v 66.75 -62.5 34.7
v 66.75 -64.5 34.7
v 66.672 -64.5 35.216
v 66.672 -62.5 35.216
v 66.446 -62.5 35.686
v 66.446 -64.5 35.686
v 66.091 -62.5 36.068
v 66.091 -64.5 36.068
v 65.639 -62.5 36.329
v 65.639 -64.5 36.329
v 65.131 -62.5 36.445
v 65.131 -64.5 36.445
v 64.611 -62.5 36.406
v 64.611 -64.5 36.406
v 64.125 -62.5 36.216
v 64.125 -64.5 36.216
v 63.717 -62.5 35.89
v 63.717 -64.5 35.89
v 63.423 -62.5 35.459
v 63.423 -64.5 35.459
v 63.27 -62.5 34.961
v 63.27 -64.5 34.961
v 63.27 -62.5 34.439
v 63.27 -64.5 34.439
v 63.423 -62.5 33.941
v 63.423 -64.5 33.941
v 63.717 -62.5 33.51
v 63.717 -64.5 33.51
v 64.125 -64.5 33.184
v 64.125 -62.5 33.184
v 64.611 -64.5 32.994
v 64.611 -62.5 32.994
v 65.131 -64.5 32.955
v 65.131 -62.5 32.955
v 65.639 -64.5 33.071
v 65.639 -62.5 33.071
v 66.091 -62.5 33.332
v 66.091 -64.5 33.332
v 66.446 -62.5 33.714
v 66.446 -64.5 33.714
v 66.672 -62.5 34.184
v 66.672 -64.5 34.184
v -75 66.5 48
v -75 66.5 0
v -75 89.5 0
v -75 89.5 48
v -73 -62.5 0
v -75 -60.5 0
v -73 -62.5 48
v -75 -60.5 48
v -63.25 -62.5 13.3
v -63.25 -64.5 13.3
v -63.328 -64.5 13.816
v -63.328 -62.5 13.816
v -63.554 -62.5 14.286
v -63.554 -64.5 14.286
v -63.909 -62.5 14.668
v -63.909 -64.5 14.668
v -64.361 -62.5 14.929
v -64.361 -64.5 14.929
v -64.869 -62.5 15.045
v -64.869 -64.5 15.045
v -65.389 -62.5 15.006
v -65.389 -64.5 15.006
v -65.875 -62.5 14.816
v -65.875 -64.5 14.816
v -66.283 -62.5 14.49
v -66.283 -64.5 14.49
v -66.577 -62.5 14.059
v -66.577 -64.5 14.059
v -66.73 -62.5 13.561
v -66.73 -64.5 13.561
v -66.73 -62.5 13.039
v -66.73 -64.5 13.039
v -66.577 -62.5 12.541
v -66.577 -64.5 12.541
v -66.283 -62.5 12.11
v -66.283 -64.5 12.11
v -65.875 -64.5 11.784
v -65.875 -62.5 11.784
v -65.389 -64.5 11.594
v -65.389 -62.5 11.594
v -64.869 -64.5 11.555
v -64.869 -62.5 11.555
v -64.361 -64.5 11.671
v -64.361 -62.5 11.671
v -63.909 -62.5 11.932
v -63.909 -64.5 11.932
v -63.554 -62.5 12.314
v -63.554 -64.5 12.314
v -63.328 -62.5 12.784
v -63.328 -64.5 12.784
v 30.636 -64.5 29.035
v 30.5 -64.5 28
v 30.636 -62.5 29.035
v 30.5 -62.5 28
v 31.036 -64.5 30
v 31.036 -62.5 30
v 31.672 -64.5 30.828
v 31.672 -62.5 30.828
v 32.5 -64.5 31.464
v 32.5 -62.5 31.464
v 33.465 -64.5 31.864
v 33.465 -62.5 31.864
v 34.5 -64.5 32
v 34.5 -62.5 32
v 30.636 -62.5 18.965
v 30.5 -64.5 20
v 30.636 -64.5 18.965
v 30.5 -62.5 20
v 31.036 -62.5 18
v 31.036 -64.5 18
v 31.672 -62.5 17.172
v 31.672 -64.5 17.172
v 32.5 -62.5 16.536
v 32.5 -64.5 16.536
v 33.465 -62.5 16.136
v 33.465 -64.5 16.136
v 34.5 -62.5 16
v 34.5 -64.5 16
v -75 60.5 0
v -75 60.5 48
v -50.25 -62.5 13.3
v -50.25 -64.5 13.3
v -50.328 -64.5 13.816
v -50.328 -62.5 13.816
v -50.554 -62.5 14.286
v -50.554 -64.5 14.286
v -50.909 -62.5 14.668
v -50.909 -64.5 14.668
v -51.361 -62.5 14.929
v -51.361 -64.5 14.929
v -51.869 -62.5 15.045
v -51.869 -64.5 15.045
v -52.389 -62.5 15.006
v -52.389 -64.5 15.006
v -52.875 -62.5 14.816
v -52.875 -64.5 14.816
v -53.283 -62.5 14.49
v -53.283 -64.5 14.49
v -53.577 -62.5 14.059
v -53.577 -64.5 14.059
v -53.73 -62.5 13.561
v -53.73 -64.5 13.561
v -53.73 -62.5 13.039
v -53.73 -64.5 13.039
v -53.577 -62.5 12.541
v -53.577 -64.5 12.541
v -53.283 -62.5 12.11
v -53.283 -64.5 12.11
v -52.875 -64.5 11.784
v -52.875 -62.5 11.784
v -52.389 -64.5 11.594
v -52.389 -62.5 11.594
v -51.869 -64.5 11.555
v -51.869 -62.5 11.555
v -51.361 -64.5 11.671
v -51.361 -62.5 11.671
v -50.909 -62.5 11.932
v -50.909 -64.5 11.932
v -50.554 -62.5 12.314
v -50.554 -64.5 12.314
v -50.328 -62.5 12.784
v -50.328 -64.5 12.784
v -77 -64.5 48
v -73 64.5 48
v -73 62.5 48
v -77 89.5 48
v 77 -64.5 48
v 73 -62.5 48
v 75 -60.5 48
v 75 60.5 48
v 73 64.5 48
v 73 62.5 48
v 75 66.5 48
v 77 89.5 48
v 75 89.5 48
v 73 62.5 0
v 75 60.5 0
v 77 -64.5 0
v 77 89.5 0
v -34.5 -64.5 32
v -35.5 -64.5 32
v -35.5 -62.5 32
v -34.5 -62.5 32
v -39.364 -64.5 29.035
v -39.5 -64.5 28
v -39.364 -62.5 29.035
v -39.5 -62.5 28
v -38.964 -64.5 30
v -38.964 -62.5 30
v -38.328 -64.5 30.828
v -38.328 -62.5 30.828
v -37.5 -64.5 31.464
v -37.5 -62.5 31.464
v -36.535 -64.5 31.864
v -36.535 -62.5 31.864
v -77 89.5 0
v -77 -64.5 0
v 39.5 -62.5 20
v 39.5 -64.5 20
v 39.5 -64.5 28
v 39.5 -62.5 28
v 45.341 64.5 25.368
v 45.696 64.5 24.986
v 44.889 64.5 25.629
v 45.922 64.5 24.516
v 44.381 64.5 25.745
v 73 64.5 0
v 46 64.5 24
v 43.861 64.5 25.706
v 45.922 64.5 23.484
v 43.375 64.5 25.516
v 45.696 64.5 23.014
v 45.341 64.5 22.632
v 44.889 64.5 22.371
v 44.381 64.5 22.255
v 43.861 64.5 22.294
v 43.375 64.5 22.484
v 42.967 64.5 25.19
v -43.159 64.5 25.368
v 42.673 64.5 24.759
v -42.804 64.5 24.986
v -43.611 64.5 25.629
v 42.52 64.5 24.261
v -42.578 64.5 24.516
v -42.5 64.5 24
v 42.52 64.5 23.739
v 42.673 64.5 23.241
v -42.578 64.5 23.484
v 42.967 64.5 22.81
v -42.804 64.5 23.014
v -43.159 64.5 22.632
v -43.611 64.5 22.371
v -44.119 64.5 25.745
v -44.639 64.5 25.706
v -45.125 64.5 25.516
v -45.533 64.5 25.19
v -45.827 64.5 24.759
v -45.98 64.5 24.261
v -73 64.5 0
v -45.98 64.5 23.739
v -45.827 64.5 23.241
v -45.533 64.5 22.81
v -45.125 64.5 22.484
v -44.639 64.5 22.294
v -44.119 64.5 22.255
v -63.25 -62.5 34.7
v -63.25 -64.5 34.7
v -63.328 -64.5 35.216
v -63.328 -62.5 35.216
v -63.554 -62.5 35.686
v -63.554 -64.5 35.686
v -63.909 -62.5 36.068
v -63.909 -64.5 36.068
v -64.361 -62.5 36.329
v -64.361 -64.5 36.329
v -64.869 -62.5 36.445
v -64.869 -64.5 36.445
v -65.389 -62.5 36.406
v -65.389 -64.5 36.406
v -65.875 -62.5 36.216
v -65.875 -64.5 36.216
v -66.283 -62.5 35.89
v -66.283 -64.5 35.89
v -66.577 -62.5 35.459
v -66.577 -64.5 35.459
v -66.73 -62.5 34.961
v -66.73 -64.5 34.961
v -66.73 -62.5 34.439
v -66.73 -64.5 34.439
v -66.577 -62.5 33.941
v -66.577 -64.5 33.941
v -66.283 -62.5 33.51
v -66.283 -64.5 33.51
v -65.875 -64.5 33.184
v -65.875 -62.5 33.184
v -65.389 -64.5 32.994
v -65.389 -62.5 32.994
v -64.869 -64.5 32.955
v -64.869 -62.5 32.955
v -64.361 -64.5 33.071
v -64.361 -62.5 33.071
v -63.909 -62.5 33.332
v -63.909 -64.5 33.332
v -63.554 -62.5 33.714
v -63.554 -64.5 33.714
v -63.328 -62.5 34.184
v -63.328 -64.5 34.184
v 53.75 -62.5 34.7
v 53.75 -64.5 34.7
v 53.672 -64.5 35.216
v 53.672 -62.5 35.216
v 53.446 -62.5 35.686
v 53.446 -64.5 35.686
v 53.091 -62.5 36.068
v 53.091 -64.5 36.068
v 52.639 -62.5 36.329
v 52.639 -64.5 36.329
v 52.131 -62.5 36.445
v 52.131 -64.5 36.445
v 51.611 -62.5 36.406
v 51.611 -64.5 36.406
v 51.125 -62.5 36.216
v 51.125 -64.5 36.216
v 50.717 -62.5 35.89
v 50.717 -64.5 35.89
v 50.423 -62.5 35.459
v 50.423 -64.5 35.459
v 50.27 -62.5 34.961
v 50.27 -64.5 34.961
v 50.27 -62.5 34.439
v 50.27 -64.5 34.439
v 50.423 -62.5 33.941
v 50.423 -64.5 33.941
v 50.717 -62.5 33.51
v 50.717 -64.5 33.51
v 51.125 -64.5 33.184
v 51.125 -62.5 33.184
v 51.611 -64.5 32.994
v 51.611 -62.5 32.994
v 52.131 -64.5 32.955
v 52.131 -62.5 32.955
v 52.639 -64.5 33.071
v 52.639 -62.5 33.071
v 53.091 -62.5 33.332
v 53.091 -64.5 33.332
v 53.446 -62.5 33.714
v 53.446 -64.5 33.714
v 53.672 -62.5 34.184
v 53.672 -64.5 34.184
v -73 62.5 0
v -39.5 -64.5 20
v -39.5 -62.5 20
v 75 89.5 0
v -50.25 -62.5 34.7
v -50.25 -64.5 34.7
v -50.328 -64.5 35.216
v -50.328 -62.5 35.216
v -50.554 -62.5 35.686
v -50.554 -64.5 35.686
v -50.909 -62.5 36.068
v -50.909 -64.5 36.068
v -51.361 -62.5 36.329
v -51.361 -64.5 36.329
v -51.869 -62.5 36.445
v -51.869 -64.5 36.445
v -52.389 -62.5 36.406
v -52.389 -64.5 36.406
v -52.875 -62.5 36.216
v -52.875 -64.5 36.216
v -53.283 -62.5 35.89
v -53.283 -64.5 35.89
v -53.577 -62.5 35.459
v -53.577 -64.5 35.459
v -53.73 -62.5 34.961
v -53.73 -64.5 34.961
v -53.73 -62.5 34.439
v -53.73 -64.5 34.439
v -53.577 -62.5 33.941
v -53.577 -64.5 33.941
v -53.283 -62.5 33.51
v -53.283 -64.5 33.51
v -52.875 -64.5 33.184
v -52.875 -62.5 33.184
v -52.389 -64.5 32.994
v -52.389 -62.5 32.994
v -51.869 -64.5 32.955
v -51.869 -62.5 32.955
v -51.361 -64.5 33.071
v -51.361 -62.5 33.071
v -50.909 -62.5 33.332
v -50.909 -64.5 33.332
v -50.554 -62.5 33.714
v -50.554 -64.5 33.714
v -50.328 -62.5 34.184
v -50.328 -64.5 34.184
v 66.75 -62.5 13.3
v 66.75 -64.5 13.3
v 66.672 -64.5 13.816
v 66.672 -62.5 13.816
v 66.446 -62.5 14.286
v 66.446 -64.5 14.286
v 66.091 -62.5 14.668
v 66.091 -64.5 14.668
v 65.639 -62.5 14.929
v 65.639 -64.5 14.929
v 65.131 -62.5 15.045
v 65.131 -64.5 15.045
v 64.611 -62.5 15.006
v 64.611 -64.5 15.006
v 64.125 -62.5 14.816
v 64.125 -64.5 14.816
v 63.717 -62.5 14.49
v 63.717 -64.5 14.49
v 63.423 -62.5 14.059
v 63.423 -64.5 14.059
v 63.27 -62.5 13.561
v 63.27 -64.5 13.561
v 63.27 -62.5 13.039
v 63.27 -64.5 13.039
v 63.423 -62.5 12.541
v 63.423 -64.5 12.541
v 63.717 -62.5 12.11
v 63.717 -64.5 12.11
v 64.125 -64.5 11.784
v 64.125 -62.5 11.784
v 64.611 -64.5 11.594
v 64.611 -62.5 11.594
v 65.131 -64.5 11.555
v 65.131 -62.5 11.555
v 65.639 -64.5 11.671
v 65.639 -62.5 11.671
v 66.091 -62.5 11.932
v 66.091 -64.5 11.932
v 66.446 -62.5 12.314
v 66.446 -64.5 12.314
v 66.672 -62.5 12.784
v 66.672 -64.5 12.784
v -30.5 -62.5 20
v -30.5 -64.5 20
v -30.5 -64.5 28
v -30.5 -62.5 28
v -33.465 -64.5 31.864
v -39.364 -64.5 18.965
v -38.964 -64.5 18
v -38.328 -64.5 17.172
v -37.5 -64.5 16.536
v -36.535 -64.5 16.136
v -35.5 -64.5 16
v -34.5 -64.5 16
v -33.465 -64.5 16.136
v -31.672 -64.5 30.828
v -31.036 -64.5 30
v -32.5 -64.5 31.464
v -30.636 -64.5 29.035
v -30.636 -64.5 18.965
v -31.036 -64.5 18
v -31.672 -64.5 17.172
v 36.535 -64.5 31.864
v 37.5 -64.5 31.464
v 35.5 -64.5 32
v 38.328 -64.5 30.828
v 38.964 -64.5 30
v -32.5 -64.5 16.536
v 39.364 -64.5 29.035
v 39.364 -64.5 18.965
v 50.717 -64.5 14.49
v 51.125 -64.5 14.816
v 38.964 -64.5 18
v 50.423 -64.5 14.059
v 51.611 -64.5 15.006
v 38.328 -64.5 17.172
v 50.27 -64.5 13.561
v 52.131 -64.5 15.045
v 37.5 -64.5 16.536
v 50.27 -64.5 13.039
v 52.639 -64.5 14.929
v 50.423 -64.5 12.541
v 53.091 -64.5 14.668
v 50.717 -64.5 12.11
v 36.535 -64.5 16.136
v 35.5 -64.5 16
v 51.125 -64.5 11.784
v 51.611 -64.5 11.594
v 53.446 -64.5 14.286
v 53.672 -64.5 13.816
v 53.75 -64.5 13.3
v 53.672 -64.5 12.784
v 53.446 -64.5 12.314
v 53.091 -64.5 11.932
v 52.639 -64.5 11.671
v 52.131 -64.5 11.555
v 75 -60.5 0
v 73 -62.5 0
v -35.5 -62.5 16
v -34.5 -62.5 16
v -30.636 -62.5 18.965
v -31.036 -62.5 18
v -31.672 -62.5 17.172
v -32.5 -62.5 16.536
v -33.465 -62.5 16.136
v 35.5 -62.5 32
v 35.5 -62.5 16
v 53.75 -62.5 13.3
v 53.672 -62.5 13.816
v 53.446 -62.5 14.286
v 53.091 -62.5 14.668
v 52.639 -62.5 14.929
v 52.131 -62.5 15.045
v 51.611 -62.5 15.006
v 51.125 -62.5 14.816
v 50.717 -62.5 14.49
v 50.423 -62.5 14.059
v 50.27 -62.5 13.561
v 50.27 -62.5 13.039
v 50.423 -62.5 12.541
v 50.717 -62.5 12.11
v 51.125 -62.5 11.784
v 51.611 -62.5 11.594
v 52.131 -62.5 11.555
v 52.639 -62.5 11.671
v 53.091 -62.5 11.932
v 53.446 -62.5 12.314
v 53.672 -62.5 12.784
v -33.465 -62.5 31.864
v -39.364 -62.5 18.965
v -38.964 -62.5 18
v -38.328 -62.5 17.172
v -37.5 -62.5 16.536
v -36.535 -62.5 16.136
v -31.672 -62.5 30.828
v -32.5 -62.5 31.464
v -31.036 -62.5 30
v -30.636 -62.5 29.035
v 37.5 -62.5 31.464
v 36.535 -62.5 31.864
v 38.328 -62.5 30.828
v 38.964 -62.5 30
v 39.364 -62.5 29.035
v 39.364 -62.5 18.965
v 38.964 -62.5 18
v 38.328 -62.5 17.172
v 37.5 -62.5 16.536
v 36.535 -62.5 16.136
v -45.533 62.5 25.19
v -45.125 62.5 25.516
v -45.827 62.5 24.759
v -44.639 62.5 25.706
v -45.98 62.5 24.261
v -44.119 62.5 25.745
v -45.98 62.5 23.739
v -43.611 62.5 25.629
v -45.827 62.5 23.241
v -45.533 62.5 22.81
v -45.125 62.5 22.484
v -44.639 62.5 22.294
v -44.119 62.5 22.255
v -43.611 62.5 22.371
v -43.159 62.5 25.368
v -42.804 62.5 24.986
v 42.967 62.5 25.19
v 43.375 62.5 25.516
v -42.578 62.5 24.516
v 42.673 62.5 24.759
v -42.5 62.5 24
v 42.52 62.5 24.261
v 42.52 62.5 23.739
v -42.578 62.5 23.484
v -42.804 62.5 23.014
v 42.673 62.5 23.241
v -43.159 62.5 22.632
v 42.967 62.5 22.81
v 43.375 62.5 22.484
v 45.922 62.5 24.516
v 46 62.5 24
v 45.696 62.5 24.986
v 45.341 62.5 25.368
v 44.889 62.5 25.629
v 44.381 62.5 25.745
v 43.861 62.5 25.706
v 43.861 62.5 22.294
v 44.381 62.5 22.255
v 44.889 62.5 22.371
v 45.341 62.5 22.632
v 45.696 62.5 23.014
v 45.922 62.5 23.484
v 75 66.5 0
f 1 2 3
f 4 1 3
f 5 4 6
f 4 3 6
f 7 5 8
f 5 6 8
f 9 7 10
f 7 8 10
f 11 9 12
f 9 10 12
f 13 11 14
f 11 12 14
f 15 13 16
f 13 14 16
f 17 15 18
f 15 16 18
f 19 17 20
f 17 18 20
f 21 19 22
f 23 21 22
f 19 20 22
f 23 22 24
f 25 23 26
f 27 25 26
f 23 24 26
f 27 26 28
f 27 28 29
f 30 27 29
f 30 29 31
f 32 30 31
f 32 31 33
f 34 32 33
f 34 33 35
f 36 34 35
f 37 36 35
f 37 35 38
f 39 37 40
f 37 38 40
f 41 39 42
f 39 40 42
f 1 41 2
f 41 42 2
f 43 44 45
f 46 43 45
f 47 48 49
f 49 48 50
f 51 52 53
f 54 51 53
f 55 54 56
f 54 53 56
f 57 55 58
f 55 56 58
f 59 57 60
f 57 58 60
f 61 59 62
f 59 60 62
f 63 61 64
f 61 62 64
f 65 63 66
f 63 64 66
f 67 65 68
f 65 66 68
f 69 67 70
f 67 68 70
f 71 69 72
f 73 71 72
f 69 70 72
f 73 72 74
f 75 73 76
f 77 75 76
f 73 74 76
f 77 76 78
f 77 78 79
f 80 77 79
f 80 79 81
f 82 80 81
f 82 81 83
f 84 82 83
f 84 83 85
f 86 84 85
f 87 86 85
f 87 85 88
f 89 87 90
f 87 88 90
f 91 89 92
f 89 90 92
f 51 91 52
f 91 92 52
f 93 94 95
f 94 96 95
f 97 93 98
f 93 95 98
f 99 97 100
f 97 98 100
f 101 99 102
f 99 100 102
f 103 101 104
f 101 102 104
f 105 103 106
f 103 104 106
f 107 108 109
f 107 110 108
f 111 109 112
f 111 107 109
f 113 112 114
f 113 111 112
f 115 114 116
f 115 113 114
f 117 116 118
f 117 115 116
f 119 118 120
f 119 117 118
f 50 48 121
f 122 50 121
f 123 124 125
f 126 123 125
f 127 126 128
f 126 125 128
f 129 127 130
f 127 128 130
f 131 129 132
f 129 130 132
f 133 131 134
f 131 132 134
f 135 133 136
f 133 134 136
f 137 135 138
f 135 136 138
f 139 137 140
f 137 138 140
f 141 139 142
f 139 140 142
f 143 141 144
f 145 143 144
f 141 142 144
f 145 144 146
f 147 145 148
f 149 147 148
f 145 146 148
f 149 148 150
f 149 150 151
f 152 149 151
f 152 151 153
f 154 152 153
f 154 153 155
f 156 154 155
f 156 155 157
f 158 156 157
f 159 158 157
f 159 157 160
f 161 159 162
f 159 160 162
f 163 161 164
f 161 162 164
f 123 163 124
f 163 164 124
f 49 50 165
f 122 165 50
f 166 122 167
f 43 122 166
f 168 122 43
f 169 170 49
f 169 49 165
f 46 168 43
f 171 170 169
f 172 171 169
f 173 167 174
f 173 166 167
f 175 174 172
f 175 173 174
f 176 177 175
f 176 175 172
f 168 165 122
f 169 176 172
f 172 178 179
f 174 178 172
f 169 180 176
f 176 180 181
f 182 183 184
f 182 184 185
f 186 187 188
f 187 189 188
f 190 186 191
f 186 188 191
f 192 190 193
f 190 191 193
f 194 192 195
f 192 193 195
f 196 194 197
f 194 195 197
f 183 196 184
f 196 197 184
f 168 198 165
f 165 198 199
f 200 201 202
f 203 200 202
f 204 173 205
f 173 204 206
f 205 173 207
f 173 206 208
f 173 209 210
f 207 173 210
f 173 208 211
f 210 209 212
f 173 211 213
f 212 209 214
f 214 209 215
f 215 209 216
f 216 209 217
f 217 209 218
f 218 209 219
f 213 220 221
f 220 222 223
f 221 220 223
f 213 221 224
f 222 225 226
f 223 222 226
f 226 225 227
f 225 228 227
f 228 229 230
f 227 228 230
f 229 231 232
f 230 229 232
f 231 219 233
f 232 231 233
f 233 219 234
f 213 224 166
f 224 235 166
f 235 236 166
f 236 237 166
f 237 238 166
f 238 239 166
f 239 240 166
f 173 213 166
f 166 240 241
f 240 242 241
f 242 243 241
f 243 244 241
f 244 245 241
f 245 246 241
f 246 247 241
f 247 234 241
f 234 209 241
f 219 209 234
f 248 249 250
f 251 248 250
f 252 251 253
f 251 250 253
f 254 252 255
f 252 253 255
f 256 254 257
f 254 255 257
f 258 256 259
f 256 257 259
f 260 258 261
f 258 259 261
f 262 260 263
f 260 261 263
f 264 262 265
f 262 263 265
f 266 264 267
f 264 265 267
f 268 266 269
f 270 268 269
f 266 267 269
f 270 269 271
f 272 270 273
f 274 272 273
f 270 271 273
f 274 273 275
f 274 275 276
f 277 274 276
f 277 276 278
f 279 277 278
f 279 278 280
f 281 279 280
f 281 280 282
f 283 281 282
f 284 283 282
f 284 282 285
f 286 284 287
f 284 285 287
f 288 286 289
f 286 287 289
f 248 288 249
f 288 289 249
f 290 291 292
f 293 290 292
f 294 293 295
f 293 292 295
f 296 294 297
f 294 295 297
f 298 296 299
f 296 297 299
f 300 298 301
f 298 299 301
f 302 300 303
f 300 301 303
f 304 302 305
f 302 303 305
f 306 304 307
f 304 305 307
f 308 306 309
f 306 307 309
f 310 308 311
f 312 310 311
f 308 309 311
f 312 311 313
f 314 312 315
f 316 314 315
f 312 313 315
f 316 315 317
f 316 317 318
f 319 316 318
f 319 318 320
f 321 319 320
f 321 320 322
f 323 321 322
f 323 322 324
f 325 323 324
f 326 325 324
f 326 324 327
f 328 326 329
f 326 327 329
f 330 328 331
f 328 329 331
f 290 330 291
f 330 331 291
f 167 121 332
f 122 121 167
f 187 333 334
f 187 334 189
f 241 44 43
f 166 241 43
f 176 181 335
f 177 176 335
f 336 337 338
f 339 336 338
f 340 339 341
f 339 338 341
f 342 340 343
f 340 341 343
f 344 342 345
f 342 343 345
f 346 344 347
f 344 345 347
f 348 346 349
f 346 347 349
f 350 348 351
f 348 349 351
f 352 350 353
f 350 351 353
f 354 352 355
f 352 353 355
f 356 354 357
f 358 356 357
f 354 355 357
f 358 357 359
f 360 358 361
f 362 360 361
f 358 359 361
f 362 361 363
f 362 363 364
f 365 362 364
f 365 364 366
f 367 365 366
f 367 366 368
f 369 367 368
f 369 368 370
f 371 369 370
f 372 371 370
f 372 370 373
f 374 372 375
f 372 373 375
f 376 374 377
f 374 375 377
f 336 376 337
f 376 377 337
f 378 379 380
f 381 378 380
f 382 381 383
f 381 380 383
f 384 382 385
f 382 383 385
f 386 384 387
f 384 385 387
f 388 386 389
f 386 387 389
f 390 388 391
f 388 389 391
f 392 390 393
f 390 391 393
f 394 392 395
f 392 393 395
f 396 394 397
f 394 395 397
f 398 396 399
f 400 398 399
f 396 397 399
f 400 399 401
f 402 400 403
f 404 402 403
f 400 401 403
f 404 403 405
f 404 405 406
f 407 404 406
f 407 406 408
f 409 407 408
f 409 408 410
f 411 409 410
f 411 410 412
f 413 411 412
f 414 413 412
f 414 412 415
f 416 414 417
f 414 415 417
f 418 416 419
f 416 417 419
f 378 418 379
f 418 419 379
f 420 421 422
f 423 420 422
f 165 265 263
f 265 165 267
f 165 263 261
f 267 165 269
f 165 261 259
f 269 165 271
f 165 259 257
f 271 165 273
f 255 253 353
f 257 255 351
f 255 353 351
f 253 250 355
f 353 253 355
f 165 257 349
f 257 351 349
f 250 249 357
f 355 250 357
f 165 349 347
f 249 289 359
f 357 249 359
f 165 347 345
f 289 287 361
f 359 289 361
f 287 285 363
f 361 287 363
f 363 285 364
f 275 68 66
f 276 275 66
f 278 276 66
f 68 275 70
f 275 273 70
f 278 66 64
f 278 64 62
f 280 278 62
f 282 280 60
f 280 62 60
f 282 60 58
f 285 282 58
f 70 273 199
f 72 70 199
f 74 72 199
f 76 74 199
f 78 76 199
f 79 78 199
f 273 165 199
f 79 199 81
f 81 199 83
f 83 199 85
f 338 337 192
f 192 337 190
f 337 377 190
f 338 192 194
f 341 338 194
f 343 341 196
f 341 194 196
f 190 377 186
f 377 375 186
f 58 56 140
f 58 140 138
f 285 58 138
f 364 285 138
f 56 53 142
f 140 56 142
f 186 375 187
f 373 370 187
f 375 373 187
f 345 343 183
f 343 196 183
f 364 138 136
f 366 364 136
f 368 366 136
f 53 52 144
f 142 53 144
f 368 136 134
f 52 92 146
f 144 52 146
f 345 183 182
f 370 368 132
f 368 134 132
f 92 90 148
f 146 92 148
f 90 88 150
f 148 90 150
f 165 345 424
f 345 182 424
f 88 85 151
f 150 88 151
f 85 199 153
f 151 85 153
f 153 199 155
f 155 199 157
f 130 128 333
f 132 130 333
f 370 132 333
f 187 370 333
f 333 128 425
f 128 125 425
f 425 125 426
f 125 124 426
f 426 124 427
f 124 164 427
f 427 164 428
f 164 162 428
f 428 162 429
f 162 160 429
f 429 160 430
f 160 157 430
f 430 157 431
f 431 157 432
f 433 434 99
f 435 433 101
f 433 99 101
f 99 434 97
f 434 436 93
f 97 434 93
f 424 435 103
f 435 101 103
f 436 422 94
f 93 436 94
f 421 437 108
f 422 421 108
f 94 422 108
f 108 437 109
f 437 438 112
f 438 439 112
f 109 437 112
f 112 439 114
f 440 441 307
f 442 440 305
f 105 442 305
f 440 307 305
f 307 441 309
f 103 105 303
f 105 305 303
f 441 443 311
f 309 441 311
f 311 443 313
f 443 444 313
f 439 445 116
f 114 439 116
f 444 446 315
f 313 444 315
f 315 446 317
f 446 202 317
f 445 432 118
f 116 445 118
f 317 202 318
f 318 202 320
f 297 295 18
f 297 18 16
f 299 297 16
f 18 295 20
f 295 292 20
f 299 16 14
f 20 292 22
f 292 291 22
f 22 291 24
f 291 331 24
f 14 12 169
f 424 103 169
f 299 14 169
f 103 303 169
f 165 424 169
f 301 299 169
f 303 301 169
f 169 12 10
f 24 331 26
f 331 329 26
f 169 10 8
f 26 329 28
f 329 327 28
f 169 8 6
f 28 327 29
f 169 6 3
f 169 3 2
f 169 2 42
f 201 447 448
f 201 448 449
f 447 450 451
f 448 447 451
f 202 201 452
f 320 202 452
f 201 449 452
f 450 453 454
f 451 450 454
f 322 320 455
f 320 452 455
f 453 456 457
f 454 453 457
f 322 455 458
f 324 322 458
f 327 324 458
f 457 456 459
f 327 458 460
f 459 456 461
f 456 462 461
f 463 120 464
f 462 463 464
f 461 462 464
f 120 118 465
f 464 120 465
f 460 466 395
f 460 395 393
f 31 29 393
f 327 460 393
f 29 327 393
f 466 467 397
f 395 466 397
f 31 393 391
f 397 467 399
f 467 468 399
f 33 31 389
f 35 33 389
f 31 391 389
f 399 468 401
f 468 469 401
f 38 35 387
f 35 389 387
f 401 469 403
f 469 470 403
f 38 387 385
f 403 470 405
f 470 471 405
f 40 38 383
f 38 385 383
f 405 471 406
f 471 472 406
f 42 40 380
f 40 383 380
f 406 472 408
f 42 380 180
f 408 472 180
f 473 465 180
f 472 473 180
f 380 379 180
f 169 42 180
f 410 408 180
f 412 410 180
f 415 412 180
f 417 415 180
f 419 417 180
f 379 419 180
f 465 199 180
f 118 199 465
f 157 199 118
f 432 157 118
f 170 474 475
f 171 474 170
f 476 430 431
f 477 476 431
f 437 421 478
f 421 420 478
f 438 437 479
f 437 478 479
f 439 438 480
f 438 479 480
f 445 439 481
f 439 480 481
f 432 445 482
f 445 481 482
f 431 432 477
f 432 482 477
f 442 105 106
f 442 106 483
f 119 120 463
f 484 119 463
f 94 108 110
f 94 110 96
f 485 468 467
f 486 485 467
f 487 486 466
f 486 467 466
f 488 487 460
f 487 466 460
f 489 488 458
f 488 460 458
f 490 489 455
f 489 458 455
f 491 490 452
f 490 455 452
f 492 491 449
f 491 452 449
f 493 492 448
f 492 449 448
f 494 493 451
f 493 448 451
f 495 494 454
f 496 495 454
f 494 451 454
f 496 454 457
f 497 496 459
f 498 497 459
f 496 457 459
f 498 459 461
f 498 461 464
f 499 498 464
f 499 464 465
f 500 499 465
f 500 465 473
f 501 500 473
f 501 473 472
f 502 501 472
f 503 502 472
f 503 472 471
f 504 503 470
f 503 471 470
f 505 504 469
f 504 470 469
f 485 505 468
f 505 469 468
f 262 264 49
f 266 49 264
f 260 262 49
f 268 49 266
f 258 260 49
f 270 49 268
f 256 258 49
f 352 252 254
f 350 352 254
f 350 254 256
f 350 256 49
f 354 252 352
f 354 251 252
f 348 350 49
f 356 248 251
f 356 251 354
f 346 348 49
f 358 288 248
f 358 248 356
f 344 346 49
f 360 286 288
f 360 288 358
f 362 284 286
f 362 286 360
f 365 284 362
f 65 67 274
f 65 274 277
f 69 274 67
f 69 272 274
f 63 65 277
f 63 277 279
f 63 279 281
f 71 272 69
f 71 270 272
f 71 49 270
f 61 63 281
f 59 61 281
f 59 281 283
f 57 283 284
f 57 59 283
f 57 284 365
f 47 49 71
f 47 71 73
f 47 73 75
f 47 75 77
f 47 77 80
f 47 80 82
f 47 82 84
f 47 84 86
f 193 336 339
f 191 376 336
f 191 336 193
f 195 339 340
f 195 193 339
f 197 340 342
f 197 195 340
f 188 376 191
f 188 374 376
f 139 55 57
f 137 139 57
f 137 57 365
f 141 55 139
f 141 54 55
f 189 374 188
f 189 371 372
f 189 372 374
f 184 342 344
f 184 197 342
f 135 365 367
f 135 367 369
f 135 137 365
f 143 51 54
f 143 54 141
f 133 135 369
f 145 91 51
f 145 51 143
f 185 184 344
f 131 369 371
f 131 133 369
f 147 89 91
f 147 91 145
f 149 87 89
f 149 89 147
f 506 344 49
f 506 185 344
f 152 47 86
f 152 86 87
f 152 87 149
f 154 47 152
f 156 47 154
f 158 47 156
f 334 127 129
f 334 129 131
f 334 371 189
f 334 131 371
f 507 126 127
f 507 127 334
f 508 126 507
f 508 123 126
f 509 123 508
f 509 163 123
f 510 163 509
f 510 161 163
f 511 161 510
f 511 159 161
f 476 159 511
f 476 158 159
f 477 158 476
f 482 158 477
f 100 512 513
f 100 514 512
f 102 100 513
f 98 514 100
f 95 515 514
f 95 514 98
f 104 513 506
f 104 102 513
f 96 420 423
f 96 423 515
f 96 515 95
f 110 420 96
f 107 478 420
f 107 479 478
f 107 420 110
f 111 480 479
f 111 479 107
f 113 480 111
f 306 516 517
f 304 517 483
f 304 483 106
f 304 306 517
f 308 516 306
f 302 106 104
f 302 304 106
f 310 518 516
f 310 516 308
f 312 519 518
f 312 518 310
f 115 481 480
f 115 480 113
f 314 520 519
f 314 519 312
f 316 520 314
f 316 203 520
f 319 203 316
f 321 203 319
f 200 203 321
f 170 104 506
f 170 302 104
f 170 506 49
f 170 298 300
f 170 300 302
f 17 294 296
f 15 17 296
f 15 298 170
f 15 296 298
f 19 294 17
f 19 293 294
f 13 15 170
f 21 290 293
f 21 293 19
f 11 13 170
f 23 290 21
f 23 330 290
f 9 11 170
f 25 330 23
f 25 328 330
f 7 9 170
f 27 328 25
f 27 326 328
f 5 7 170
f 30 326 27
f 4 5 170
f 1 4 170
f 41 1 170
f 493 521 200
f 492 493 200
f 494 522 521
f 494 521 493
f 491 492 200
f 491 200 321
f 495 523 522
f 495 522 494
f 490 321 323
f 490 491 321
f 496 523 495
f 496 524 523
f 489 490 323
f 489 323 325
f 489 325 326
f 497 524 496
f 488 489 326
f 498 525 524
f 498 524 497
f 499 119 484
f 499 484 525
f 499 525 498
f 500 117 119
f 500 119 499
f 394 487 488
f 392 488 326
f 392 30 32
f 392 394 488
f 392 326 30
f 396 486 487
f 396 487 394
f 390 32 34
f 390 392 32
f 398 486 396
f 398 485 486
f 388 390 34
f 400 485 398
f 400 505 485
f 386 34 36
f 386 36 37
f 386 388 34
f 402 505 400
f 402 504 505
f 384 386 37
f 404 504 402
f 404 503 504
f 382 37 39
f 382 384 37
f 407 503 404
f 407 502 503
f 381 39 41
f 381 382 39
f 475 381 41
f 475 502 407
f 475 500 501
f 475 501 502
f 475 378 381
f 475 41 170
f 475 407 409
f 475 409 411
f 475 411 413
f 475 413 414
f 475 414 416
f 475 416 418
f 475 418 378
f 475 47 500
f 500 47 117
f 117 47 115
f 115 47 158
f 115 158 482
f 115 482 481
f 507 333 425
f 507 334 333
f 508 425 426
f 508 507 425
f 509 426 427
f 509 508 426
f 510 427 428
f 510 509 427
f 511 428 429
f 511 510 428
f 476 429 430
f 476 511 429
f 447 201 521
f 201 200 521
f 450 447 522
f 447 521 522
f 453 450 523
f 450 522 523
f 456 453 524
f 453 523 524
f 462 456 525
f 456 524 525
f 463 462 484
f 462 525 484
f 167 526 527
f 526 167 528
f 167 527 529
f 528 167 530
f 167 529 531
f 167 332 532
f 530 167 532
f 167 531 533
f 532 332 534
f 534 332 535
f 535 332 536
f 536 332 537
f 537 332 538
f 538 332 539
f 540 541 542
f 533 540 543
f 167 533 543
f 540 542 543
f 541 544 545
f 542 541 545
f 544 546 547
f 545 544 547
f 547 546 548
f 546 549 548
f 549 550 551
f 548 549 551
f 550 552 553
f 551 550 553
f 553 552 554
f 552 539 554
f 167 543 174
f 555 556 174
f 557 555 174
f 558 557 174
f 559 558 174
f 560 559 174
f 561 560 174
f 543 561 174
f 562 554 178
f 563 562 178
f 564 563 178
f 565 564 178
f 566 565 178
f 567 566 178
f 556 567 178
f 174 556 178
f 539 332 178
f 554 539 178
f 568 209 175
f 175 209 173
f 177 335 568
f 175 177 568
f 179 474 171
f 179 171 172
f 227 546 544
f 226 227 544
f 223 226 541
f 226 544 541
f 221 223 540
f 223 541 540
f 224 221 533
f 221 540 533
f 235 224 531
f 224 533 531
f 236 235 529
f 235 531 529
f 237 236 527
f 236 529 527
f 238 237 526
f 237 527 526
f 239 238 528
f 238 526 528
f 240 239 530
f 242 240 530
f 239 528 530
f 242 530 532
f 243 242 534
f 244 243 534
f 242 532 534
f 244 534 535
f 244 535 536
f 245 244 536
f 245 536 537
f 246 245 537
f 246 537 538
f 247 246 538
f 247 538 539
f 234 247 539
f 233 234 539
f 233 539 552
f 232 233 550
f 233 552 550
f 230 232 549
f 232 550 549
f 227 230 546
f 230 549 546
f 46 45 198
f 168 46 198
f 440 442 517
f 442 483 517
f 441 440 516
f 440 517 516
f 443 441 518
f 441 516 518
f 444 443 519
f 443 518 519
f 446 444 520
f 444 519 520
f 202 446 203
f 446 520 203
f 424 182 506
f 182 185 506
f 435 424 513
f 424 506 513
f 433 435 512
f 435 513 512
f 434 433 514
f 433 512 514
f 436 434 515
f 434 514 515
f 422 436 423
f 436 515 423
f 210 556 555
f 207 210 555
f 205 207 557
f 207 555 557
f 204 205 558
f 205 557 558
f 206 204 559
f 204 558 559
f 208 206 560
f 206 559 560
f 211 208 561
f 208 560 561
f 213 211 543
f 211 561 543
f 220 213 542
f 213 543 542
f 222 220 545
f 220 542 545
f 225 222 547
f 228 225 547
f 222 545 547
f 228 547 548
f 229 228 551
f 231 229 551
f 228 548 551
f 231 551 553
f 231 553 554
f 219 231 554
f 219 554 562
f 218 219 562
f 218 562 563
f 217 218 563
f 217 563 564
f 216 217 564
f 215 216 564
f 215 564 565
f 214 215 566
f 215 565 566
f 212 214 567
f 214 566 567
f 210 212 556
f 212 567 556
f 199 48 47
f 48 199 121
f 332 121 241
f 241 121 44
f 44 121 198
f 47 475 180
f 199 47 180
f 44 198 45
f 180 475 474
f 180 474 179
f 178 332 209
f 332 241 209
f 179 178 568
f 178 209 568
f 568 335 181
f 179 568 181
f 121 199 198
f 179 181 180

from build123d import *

# Parameters (mm, degrees)
F0_W     = 150
F0_H     = 125
F1_DEPTH = 48
F2_R     = 1.75
F2_W     = 9
F2_H     = 16
F3_DEPTH = 2
F4_R     = 1.75
F5_DEPTH = 2
F6_SIZE  = 2
F7_R     = 4


with BuildPart() as f1:
    # F0 (on Top) → F1 (new body)
    with BuildSketch(Plane.XY):
        Polygon((75, 89.5), (75, 64.5), (-75, 64.5), (-75, 89.5), (-77, 89.5), (-77, 64.5), (-77, -64.5), (77, -64.5), (77, 64.5), (77, 89.5), align=None)
        Rectangle(F0_W, F0_H, mode=Mode.SUBTRACT)
    extrude(amount=F1_DEPTH)

    # F2 (on face) → F3 (cut)
    with BuildSketch(Plane.XZ.offset(64.5)):
        with Locations((-65, 34.7)):
            Circle(F2_R)
        with Locations((-52, 34.7)):
            Circle(F2_R)
        with Locations((-65, 13.3)):
            Circle(F2_R)
        with Locations((-52, 13.3)):
            Circle(F2_R)
        with Locations((52, 34.7)):
            Circle(F2_R)
        with Locations((65, 34.7)):
            Circle(F2_R)
        with Locations((52, 13.3)):
            Circle(F2_R)
        with Locations((65, 13.3)):
            Circle(F2_R)
        with Locations((-35, 24)):
            Rectangle(F2_W, F2_H)
        with Locations((35, 24)):
            Rectangle(F2_W, F2_H)
    extrude(amount=-F3_DEPTH, mode=Mode.SUBTRACT)

    # F4 (on face) → F5 (cut)
    with BuildSketch(Plane.XZ.offset(-62.5)):
        with Locations((-44.25, 24)):
            Circle(F4_R)
        with Locations((44.25, 24)):
            Circle(F4_R)
    extrude(amount=-F5_DEPTH, mode=Mode.SUBTRACT)

    # F6
    f6_edges = [f1.edges().sort_by_distance(p)[0] for p in [
        (-75, 62.5, 24),
        (-75, -62.5, 24),
        (75, -62.5, 24),
        (75, 62.5, 24),
        (75, 64.5, 24),
        (-75, 64.5, 24),
    ]]
    chamfer(f6_edges, length=F6_SIZE)

    # F7
    f7_edges = [f1.edges().sort_by_distance(p)[0] for p in [
        (-39.5, -63.5, 16),
        (-30.5, -63.5, 16),
        (-30.5, -63.5, 32),
        (-39.5, -63.5, 32),
        (30.5, -63.5, 16),
        (39.5, -63.5, 16),
        (39.5, -63.5, 32),
        (30.5, -63.5, 32),
    ]]
    fillet(f7_edges, radius=F7_R)


solid = f1.part
